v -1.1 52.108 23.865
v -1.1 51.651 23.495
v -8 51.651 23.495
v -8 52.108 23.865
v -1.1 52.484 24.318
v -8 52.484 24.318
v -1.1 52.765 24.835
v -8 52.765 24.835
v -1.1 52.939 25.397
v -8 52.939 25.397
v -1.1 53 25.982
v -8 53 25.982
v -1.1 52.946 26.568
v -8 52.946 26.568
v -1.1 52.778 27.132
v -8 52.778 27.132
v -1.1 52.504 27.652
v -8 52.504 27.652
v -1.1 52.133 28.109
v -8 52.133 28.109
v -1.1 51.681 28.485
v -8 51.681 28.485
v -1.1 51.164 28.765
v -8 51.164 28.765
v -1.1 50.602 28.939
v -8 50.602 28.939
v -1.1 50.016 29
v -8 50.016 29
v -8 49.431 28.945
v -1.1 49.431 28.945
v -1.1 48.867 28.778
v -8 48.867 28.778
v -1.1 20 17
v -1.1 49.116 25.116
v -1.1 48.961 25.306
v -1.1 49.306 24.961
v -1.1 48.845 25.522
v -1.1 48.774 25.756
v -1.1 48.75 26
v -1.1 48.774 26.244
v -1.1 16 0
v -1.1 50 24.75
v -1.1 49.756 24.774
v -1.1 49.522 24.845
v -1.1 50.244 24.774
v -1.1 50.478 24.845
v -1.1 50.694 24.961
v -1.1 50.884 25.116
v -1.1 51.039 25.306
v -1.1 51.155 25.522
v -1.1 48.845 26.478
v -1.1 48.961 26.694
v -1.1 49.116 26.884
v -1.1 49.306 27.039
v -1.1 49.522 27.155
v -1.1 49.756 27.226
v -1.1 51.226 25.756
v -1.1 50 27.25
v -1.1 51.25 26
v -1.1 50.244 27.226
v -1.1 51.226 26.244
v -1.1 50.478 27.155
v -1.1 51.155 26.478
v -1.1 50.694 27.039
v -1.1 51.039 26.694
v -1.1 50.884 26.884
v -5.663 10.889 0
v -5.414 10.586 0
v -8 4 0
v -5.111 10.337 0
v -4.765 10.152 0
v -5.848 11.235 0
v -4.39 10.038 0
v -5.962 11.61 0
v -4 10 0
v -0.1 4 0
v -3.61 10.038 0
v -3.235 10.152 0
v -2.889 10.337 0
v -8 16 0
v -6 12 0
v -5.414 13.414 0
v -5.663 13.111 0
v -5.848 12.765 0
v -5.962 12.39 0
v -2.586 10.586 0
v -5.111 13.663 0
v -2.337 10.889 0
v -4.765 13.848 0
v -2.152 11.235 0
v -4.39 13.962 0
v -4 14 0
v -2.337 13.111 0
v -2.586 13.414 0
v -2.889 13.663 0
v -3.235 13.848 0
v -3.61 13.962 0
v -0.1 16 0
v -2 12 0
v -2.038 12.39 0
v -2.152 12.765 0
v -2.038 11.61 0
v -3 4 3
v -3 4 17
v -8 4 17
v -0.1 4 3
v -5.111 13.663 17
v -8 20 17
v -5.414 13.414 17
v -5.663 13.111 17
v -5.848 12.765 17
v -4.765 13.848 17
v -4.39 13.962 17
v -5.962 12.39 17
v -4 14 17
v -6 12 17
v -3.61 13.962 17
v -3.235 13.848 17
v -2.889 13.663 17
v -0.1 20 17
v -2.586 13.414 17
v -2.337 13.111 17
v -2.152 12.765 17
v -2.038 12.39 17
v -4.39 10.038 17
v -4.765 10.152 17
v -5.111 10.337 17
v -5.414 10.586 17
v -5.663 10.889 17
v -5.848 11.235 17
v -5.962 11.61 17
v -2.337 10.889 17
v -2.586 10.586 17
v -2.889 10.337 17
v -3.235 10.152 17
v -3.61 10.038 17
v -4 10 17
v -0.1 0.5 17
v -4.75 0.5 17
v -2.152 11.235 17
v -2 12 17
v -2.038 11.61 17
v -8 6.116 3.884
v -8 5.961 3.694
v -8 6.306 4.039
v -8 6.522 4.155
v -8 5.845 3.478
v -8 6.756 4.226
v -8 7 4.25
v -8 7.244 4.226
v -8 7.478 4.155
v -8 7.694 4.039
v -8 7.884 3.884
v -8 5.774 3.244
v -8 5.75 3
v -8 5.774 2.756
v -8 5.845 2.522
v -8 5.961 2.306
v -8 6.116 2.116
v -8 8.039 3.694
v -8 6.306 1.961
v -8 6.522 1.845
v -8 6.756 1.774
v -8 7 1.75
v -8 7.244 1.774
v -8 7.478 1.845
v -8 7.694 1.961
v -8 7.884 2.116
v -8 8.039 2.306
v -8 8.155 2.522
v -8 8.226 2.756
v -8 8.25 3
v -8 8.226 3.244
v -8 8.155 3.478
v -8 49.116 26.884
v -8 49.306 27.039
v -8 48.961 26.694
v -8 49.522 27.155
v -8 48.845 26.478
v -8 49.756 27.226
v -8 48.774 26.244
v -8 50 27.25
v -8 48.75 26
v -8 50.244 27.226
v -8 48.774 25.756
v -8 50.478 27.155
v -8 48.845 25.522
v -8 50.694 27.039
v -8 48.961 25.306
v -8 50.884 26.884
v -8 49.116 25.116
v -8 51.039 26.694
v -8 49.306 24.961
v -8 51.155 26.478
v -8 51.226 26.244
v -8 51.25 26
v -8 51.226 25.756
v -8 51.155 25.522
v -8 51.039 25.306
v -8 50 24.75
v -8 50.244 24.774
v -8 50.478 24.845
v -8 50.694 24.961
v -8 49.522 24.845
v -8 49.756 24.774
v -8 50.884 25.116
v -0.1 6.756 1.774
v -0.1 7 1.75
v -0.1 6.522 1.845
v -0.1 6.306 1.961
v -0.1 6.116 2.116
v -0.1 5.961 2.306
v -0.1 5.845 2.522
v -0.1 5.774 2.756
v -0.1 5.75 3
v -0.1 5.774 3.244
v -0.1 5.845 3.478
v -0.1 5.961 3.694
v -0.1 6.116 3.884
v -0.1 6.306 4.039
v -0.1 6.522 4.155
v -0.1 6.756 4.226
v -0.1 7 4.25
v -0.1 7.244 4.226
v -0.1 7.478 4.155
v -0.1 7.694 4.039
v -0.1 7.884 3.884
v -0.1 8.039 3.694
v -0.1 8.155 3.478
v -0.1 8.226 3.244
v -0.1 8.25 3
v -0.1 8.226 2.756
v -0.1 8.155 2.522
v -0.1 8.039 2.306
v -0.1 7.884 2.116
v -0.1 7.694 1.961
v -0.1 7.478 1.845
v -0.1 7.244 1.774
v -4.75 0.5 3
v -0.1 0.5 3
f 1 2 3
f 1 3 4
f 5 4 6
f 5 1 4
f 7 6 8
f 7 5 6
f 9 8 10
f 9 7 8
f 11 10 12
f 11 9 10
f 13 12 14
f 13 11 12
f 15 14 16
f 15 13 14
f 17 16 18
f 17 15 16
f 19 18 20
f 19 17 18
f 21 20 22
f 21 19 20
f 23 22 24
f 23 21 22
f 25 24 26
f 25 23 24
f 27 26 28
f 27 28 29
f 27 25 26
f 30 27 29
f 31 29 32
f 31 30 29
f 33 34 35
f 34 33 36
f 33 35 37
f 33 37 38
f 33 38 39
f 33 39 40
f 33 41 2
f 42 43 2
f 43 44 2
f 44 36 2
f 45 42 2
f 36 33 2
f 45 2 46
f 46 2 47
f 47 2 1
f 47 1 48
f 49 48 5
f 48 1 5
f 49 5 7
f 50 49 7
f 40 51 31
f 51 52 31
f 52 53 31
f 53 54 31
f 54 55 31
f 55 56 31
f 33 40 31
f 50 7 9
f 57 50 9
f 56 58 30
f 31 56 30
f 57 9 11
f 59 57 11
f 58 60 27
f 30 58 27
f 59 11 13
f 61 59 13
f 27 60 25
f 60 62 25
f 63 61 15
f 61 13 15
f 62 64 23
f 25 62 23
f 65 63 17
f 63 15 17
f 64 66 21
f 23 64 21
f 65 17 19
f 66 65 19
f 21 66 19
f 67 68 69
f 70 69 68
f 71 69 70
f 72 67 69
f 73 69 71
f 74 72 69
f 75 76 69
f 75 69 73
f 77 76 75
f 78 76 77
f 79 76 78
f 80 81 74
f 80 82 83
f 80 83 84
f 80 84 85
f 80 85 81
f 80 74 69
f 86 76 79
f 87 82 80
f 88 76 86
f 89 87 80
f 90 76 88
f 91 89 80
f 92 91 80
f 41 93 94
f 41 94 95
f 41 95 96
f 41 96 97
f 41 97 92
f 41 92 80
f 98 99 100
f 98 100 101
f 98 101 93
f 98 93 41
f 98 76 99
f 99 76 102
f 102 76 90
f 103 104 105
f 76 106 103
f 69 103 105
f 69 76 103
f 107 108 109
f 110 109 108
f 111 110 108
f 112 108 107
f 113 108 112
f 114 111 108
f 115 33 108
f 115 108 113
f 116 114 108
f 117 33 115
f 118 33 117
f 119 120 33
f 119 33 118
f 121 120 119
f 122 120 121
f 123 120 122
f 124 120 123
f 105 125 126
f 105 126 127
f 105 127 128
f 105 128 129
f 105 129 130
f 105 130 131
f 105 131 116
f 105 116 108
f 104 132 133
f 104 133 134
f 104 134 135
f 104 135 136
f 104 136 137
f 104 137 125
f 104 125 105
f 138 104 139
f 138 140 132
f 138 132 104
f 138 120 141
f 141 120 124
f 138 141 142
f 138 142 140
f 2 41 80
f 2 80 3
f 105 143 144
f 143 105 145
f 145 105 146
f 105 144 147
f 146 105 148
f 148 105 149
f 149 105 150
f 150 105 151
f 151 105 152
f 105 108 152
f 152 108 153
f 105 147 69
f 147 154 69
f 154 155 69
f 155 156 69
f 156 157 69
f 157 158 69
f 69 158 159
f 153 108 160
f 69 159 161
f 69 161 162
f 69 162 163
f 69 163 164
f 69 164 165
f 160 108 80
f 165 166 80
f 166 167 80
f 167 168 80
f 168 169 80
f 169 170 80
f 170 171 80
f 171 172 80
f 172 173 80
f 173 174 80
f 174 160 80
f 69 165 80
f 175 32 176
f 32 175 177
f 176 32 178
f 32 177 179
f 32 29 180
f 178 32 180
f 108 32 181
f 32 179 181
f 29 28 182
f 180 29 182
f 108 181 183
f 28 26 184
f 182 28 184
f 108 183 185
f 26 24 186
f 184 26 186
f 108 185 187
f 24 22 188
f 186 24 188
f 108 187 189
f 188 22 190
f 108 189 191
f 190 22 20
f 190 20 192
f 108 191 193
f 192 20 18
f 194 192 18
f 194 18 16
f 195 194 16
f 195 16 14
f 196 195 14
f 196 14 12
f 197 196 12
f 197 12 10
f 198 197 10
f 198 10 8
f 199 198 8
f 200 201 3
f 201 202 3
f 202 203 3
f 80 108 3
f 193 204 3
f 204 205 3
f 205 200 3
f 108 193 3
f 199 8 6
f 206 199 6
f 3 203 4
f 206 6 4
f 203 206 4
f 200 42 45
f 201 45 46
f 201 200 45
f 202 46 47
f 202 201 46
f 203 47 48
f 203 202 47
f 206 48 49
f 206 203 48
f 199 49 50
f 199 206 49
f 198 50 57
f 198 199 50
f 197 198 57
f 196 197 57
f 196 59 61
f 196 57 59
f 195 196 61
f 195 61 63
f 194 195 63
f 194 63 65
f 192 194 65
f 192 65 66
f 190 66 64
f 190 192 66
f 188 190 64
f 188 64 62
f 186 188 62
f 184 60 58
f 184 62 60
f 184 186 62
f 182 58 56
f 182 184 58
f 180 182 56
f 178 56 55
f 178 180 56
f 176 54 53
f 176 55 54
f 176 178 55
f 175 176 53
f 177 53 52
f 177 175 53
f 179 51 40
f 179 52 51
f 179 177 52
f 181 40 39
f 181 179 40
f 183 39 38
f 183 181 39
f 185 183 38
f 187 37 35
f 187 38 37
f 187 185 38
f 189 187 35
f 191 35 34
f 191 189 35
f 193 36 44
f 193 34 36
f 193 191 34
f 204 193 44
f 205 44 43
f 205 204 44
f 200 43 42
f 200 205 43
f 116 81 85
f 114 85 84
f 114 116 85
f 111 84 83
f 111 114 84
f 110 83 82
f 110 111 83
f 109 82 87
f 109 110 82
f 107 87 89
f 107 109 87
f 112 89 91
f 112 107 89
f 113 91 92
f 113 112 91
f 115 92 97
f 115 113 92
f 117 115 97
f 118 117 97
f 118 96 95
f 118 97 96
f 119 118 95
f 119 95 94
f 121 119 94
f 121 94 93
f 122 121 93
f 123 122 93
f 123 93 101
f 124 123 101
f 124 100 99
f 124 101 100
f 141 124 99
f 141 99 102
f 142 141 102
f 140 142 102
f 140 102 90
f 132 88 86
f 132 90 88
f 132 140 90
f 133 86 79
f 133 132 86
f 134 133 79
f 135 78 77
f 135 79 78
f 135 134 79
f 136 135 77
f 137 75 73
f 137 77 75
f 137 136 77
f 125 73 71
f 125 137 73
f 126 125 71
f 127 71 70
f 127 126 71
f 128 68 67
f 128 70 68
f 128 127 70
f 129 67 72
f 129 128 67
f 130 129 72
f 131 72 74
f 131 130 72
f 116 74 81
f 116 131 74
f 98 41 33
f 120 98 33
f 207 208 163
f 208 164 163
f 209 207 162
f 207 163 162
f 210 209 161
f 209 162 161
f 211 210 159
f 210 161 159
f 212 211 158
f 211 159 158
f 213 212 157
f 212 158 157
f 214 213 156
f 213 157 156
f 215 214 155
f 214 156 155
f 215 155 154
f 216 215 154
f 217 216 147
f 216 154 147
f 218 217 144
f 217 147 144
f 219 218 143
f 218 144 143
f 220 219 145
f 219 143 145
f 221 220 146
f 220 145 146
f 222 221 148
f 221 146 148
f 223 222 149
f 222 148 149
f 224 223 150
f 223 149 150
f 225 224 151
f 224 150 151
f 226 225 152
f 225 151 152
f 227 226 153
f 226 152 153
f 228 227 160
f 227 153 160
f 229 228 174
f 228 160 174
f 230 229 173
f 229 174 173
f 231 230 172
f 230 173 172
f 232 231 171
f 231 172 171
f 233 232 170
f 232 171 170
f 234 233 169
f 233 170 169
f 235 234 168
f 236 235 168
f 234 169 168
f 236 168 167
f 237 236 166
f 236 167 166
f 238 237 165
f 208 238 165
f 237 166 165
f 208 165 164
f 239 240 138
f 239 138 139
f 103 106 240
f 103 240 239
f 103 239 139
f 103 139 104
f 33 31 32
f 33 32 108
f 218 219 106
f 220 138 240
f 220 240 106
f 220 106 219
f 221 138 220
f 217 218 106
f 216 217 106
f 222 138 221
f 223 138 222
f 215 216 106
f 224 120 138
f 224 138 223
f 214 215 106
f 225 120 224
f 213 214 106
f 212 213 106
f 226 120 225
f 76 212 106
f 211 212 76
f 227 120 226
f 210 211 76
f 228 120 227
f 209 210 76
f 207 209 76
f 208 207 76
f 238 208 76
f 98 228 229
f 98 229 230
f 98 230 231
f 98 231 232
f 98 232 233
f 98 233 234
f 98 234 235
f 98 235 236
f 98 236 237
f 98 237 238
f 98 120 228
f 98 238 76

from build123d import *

# Parameters (mm, degrees)
SKETCH1_R             = 1.25
BOSS_EXTRUDE1_DEPTH   = 8
CUT_EXTRUDE2_DEPTH    = 61.942595941
M3X0_5_TAPPED_HOLE1_D = 2.5
SKETCH7_W             = 8
SKETCH7_H             = 0.5
CUT_EXTRUDE3_DEPTH    = 61.942595941
SKETCH8_R             = 2
CUT_EXTRUDE4_DEPTH    = 57.231663678
SKETCH9_W             = 38.671878994
SKETCH9_H             = 56.45112265
CUT_EXTRUDE5_DEPTH    = 8.1
CUT_EXTRUDE6_DEPTH    = 3
CUT_EXTRUDE8_START    = -1
CUT_EXTRUDE8_DEPTH    = 1


with BuildPart() as part:
    # Sketch1 → Boss-Extrude1 (new body)
    with BuildSketch(Plane(origin=(0, 0, 0), x_dir=(0, 0, -1), z_dir=(1, 0, 0))):
        with BuildLine():
            Line((0, 0), (0, 16))
            Line((0, 16), (-23.49505807, 51.650837947))
            ThreePointArc((-23.49505807, 51.650837947), (-27.398738146, 52.653965259), (-28.777698581, 48.866690426))
            Line((-28.777698581, 48.866690426), (-17, 20))
            Line((-17, 20), (-17, 0))
            Line((-17, 0), (0, 0))
        make_face()
        with Locations((-26, 50)):
            Circle(SKETCH1_R, mode=Mode.SUBTRACT)
    boss_extrude1 = extrude(amount=BOSS_EXTRUDE1_DEPTH)

    # Sketch3 → Cut-Extrude2 (cut, through all)
    with BuildSketch(Plane(origin=(0, 0, 0), x_dir=(-1, 0, 0), z_dir=(0, 0, -1))):
        Polygon((-8, 0), (-5, 0), (-3, 4), (-8, 4), align=None)
    cut_extrude2 = extrude(amount=-CUT_EXTRUDE2_DEPTH, mode=Mode.SUBTRACT)

    # M3x0.5 Tapped Hole1 (through all)
    with Locations(Plane(origin=(8, 7, 3), x_dir=(0, 0, 1), z_dir=(1, 0, 0))):
        with Locations((0, 0)):
            m3x0_5_tapped_hole1 = Hole(M3X0_5_TAPPED_HOLE1_D / 2)

    # Sketch7 → Cut-Extrude3 (cut, through all)
    with BuildSketch(Plane(origin=(0, 0, 0), x_dir=(-1, 0, 0), z_dir=(0, 0, -1))):
        with Locations((-4, 0.25)):
            Rectangle(SKETCH7_W, SKETCH7_H)
    cut_extrude3 = extrude(amount=-CUT_EXTRUDE3_DEPTH, mode=Mode.SUBTRACT)

    # Sketch8 → Cut-Extrude4 (cut, through all)
    with BuildSketch(Plane.XY.offset(17)):
        with Locations((4, 12)):
            Circle(SKETCH8_R)
    cut_extrude4 = extrude(amount=-CUT_EXTRUDE4_DEPTH, mode=Mode.SUBTRACT)

    # Mirror1: Boss-Extrude1, Cut-Extrude2, M3x0.5 Tapped Hole1, Cut-Extrude3, Cut-Extrude4 across plane
    add(boss_extrude1.mirror(Plane(origin=(0, 50, 26), x_dir=(0, 0, 1), z_dir=(1, 0, 0))))
    add(cut_extrude2.mirror(Plane(origin=(0, 50, 26), x_dir=(0, 0, 1), z_dir=(1, 0, 0))), mode=Mode.SUBTRACT)
    add(m3x0_5_tapped_hole1.mirror(Plane(origin=(0, 50, 26), x_dir=(0, 0, 1), z_dir=(1, 0, 0))), mode=Mode.SUBTRACT)
    add(cut_extrude3.mirror(Plane(origin=(0, 50, 26), x_dir=(0, 0, 1), z_dir=(1, 0, 0))), mode=Mode.SUBTRACT)
    add(cut_extrude4.mirror(Plane(origin=(0, 50, 26), x_dir=(0, 0, 1), z_dir=(1, 0, 0))), mode=Mode.SUBTRACT)

    # Sketch9 → Cut-Extrude5 (cut)
    with BuildSketch(Plane(origin=(8, 0, 0), x_dir=(0, 0, -1), z_dir=(1, 0, 0))):
        with Locations((-19.335939497, 28.725561325)):
            Rectangle(SKETCH9_W, SKETCH9_H)
    extrude(amount=-CUT_EXTRUDE5_DEPTH, mode=Mode.SUBTRACT)

    # Sketch10 → Cut-Extrude6 (cut)
    with BuildSketch(Plane(origin=(0, 0, 0), x_dir=(-1, 0, 0), z_dir=(0, 0, -1))):
        Polygon((4.75, 0.5), (3, 4), (0.1, 4), (0.1, 0.5), align=None)
    extrude(amount=-CUT_EXTRUDE6_DEPTH, mode=Mode.SUBTRACT)

    # Sketch12 → Cut-Extrude8 (cut)
    with BuildSketch(Plane(origin=(-0.1, 0, 0), x_dir=(0, 0, -1), z_dir=(1, 0, 0)).offset(CUT_EXTRUDE8_START)):
        with BuildLine():
            Line((-17, 20), (-28.777698581, 48.866690426))
            ThreePointArc((-28.777698581, 48.866690426), (-27.398738146, 52.653965259), (-23.49505807, 51.650837947))
            Line((-23.49505807, 51.650837947), (0, 16))
            Line((0, 16), (-17, 20))
        make_face()
    extrude(amount=CUT_EXTRUDE8_DEPTH, mode=Mode.SUBTRACT)


solid = part.part
